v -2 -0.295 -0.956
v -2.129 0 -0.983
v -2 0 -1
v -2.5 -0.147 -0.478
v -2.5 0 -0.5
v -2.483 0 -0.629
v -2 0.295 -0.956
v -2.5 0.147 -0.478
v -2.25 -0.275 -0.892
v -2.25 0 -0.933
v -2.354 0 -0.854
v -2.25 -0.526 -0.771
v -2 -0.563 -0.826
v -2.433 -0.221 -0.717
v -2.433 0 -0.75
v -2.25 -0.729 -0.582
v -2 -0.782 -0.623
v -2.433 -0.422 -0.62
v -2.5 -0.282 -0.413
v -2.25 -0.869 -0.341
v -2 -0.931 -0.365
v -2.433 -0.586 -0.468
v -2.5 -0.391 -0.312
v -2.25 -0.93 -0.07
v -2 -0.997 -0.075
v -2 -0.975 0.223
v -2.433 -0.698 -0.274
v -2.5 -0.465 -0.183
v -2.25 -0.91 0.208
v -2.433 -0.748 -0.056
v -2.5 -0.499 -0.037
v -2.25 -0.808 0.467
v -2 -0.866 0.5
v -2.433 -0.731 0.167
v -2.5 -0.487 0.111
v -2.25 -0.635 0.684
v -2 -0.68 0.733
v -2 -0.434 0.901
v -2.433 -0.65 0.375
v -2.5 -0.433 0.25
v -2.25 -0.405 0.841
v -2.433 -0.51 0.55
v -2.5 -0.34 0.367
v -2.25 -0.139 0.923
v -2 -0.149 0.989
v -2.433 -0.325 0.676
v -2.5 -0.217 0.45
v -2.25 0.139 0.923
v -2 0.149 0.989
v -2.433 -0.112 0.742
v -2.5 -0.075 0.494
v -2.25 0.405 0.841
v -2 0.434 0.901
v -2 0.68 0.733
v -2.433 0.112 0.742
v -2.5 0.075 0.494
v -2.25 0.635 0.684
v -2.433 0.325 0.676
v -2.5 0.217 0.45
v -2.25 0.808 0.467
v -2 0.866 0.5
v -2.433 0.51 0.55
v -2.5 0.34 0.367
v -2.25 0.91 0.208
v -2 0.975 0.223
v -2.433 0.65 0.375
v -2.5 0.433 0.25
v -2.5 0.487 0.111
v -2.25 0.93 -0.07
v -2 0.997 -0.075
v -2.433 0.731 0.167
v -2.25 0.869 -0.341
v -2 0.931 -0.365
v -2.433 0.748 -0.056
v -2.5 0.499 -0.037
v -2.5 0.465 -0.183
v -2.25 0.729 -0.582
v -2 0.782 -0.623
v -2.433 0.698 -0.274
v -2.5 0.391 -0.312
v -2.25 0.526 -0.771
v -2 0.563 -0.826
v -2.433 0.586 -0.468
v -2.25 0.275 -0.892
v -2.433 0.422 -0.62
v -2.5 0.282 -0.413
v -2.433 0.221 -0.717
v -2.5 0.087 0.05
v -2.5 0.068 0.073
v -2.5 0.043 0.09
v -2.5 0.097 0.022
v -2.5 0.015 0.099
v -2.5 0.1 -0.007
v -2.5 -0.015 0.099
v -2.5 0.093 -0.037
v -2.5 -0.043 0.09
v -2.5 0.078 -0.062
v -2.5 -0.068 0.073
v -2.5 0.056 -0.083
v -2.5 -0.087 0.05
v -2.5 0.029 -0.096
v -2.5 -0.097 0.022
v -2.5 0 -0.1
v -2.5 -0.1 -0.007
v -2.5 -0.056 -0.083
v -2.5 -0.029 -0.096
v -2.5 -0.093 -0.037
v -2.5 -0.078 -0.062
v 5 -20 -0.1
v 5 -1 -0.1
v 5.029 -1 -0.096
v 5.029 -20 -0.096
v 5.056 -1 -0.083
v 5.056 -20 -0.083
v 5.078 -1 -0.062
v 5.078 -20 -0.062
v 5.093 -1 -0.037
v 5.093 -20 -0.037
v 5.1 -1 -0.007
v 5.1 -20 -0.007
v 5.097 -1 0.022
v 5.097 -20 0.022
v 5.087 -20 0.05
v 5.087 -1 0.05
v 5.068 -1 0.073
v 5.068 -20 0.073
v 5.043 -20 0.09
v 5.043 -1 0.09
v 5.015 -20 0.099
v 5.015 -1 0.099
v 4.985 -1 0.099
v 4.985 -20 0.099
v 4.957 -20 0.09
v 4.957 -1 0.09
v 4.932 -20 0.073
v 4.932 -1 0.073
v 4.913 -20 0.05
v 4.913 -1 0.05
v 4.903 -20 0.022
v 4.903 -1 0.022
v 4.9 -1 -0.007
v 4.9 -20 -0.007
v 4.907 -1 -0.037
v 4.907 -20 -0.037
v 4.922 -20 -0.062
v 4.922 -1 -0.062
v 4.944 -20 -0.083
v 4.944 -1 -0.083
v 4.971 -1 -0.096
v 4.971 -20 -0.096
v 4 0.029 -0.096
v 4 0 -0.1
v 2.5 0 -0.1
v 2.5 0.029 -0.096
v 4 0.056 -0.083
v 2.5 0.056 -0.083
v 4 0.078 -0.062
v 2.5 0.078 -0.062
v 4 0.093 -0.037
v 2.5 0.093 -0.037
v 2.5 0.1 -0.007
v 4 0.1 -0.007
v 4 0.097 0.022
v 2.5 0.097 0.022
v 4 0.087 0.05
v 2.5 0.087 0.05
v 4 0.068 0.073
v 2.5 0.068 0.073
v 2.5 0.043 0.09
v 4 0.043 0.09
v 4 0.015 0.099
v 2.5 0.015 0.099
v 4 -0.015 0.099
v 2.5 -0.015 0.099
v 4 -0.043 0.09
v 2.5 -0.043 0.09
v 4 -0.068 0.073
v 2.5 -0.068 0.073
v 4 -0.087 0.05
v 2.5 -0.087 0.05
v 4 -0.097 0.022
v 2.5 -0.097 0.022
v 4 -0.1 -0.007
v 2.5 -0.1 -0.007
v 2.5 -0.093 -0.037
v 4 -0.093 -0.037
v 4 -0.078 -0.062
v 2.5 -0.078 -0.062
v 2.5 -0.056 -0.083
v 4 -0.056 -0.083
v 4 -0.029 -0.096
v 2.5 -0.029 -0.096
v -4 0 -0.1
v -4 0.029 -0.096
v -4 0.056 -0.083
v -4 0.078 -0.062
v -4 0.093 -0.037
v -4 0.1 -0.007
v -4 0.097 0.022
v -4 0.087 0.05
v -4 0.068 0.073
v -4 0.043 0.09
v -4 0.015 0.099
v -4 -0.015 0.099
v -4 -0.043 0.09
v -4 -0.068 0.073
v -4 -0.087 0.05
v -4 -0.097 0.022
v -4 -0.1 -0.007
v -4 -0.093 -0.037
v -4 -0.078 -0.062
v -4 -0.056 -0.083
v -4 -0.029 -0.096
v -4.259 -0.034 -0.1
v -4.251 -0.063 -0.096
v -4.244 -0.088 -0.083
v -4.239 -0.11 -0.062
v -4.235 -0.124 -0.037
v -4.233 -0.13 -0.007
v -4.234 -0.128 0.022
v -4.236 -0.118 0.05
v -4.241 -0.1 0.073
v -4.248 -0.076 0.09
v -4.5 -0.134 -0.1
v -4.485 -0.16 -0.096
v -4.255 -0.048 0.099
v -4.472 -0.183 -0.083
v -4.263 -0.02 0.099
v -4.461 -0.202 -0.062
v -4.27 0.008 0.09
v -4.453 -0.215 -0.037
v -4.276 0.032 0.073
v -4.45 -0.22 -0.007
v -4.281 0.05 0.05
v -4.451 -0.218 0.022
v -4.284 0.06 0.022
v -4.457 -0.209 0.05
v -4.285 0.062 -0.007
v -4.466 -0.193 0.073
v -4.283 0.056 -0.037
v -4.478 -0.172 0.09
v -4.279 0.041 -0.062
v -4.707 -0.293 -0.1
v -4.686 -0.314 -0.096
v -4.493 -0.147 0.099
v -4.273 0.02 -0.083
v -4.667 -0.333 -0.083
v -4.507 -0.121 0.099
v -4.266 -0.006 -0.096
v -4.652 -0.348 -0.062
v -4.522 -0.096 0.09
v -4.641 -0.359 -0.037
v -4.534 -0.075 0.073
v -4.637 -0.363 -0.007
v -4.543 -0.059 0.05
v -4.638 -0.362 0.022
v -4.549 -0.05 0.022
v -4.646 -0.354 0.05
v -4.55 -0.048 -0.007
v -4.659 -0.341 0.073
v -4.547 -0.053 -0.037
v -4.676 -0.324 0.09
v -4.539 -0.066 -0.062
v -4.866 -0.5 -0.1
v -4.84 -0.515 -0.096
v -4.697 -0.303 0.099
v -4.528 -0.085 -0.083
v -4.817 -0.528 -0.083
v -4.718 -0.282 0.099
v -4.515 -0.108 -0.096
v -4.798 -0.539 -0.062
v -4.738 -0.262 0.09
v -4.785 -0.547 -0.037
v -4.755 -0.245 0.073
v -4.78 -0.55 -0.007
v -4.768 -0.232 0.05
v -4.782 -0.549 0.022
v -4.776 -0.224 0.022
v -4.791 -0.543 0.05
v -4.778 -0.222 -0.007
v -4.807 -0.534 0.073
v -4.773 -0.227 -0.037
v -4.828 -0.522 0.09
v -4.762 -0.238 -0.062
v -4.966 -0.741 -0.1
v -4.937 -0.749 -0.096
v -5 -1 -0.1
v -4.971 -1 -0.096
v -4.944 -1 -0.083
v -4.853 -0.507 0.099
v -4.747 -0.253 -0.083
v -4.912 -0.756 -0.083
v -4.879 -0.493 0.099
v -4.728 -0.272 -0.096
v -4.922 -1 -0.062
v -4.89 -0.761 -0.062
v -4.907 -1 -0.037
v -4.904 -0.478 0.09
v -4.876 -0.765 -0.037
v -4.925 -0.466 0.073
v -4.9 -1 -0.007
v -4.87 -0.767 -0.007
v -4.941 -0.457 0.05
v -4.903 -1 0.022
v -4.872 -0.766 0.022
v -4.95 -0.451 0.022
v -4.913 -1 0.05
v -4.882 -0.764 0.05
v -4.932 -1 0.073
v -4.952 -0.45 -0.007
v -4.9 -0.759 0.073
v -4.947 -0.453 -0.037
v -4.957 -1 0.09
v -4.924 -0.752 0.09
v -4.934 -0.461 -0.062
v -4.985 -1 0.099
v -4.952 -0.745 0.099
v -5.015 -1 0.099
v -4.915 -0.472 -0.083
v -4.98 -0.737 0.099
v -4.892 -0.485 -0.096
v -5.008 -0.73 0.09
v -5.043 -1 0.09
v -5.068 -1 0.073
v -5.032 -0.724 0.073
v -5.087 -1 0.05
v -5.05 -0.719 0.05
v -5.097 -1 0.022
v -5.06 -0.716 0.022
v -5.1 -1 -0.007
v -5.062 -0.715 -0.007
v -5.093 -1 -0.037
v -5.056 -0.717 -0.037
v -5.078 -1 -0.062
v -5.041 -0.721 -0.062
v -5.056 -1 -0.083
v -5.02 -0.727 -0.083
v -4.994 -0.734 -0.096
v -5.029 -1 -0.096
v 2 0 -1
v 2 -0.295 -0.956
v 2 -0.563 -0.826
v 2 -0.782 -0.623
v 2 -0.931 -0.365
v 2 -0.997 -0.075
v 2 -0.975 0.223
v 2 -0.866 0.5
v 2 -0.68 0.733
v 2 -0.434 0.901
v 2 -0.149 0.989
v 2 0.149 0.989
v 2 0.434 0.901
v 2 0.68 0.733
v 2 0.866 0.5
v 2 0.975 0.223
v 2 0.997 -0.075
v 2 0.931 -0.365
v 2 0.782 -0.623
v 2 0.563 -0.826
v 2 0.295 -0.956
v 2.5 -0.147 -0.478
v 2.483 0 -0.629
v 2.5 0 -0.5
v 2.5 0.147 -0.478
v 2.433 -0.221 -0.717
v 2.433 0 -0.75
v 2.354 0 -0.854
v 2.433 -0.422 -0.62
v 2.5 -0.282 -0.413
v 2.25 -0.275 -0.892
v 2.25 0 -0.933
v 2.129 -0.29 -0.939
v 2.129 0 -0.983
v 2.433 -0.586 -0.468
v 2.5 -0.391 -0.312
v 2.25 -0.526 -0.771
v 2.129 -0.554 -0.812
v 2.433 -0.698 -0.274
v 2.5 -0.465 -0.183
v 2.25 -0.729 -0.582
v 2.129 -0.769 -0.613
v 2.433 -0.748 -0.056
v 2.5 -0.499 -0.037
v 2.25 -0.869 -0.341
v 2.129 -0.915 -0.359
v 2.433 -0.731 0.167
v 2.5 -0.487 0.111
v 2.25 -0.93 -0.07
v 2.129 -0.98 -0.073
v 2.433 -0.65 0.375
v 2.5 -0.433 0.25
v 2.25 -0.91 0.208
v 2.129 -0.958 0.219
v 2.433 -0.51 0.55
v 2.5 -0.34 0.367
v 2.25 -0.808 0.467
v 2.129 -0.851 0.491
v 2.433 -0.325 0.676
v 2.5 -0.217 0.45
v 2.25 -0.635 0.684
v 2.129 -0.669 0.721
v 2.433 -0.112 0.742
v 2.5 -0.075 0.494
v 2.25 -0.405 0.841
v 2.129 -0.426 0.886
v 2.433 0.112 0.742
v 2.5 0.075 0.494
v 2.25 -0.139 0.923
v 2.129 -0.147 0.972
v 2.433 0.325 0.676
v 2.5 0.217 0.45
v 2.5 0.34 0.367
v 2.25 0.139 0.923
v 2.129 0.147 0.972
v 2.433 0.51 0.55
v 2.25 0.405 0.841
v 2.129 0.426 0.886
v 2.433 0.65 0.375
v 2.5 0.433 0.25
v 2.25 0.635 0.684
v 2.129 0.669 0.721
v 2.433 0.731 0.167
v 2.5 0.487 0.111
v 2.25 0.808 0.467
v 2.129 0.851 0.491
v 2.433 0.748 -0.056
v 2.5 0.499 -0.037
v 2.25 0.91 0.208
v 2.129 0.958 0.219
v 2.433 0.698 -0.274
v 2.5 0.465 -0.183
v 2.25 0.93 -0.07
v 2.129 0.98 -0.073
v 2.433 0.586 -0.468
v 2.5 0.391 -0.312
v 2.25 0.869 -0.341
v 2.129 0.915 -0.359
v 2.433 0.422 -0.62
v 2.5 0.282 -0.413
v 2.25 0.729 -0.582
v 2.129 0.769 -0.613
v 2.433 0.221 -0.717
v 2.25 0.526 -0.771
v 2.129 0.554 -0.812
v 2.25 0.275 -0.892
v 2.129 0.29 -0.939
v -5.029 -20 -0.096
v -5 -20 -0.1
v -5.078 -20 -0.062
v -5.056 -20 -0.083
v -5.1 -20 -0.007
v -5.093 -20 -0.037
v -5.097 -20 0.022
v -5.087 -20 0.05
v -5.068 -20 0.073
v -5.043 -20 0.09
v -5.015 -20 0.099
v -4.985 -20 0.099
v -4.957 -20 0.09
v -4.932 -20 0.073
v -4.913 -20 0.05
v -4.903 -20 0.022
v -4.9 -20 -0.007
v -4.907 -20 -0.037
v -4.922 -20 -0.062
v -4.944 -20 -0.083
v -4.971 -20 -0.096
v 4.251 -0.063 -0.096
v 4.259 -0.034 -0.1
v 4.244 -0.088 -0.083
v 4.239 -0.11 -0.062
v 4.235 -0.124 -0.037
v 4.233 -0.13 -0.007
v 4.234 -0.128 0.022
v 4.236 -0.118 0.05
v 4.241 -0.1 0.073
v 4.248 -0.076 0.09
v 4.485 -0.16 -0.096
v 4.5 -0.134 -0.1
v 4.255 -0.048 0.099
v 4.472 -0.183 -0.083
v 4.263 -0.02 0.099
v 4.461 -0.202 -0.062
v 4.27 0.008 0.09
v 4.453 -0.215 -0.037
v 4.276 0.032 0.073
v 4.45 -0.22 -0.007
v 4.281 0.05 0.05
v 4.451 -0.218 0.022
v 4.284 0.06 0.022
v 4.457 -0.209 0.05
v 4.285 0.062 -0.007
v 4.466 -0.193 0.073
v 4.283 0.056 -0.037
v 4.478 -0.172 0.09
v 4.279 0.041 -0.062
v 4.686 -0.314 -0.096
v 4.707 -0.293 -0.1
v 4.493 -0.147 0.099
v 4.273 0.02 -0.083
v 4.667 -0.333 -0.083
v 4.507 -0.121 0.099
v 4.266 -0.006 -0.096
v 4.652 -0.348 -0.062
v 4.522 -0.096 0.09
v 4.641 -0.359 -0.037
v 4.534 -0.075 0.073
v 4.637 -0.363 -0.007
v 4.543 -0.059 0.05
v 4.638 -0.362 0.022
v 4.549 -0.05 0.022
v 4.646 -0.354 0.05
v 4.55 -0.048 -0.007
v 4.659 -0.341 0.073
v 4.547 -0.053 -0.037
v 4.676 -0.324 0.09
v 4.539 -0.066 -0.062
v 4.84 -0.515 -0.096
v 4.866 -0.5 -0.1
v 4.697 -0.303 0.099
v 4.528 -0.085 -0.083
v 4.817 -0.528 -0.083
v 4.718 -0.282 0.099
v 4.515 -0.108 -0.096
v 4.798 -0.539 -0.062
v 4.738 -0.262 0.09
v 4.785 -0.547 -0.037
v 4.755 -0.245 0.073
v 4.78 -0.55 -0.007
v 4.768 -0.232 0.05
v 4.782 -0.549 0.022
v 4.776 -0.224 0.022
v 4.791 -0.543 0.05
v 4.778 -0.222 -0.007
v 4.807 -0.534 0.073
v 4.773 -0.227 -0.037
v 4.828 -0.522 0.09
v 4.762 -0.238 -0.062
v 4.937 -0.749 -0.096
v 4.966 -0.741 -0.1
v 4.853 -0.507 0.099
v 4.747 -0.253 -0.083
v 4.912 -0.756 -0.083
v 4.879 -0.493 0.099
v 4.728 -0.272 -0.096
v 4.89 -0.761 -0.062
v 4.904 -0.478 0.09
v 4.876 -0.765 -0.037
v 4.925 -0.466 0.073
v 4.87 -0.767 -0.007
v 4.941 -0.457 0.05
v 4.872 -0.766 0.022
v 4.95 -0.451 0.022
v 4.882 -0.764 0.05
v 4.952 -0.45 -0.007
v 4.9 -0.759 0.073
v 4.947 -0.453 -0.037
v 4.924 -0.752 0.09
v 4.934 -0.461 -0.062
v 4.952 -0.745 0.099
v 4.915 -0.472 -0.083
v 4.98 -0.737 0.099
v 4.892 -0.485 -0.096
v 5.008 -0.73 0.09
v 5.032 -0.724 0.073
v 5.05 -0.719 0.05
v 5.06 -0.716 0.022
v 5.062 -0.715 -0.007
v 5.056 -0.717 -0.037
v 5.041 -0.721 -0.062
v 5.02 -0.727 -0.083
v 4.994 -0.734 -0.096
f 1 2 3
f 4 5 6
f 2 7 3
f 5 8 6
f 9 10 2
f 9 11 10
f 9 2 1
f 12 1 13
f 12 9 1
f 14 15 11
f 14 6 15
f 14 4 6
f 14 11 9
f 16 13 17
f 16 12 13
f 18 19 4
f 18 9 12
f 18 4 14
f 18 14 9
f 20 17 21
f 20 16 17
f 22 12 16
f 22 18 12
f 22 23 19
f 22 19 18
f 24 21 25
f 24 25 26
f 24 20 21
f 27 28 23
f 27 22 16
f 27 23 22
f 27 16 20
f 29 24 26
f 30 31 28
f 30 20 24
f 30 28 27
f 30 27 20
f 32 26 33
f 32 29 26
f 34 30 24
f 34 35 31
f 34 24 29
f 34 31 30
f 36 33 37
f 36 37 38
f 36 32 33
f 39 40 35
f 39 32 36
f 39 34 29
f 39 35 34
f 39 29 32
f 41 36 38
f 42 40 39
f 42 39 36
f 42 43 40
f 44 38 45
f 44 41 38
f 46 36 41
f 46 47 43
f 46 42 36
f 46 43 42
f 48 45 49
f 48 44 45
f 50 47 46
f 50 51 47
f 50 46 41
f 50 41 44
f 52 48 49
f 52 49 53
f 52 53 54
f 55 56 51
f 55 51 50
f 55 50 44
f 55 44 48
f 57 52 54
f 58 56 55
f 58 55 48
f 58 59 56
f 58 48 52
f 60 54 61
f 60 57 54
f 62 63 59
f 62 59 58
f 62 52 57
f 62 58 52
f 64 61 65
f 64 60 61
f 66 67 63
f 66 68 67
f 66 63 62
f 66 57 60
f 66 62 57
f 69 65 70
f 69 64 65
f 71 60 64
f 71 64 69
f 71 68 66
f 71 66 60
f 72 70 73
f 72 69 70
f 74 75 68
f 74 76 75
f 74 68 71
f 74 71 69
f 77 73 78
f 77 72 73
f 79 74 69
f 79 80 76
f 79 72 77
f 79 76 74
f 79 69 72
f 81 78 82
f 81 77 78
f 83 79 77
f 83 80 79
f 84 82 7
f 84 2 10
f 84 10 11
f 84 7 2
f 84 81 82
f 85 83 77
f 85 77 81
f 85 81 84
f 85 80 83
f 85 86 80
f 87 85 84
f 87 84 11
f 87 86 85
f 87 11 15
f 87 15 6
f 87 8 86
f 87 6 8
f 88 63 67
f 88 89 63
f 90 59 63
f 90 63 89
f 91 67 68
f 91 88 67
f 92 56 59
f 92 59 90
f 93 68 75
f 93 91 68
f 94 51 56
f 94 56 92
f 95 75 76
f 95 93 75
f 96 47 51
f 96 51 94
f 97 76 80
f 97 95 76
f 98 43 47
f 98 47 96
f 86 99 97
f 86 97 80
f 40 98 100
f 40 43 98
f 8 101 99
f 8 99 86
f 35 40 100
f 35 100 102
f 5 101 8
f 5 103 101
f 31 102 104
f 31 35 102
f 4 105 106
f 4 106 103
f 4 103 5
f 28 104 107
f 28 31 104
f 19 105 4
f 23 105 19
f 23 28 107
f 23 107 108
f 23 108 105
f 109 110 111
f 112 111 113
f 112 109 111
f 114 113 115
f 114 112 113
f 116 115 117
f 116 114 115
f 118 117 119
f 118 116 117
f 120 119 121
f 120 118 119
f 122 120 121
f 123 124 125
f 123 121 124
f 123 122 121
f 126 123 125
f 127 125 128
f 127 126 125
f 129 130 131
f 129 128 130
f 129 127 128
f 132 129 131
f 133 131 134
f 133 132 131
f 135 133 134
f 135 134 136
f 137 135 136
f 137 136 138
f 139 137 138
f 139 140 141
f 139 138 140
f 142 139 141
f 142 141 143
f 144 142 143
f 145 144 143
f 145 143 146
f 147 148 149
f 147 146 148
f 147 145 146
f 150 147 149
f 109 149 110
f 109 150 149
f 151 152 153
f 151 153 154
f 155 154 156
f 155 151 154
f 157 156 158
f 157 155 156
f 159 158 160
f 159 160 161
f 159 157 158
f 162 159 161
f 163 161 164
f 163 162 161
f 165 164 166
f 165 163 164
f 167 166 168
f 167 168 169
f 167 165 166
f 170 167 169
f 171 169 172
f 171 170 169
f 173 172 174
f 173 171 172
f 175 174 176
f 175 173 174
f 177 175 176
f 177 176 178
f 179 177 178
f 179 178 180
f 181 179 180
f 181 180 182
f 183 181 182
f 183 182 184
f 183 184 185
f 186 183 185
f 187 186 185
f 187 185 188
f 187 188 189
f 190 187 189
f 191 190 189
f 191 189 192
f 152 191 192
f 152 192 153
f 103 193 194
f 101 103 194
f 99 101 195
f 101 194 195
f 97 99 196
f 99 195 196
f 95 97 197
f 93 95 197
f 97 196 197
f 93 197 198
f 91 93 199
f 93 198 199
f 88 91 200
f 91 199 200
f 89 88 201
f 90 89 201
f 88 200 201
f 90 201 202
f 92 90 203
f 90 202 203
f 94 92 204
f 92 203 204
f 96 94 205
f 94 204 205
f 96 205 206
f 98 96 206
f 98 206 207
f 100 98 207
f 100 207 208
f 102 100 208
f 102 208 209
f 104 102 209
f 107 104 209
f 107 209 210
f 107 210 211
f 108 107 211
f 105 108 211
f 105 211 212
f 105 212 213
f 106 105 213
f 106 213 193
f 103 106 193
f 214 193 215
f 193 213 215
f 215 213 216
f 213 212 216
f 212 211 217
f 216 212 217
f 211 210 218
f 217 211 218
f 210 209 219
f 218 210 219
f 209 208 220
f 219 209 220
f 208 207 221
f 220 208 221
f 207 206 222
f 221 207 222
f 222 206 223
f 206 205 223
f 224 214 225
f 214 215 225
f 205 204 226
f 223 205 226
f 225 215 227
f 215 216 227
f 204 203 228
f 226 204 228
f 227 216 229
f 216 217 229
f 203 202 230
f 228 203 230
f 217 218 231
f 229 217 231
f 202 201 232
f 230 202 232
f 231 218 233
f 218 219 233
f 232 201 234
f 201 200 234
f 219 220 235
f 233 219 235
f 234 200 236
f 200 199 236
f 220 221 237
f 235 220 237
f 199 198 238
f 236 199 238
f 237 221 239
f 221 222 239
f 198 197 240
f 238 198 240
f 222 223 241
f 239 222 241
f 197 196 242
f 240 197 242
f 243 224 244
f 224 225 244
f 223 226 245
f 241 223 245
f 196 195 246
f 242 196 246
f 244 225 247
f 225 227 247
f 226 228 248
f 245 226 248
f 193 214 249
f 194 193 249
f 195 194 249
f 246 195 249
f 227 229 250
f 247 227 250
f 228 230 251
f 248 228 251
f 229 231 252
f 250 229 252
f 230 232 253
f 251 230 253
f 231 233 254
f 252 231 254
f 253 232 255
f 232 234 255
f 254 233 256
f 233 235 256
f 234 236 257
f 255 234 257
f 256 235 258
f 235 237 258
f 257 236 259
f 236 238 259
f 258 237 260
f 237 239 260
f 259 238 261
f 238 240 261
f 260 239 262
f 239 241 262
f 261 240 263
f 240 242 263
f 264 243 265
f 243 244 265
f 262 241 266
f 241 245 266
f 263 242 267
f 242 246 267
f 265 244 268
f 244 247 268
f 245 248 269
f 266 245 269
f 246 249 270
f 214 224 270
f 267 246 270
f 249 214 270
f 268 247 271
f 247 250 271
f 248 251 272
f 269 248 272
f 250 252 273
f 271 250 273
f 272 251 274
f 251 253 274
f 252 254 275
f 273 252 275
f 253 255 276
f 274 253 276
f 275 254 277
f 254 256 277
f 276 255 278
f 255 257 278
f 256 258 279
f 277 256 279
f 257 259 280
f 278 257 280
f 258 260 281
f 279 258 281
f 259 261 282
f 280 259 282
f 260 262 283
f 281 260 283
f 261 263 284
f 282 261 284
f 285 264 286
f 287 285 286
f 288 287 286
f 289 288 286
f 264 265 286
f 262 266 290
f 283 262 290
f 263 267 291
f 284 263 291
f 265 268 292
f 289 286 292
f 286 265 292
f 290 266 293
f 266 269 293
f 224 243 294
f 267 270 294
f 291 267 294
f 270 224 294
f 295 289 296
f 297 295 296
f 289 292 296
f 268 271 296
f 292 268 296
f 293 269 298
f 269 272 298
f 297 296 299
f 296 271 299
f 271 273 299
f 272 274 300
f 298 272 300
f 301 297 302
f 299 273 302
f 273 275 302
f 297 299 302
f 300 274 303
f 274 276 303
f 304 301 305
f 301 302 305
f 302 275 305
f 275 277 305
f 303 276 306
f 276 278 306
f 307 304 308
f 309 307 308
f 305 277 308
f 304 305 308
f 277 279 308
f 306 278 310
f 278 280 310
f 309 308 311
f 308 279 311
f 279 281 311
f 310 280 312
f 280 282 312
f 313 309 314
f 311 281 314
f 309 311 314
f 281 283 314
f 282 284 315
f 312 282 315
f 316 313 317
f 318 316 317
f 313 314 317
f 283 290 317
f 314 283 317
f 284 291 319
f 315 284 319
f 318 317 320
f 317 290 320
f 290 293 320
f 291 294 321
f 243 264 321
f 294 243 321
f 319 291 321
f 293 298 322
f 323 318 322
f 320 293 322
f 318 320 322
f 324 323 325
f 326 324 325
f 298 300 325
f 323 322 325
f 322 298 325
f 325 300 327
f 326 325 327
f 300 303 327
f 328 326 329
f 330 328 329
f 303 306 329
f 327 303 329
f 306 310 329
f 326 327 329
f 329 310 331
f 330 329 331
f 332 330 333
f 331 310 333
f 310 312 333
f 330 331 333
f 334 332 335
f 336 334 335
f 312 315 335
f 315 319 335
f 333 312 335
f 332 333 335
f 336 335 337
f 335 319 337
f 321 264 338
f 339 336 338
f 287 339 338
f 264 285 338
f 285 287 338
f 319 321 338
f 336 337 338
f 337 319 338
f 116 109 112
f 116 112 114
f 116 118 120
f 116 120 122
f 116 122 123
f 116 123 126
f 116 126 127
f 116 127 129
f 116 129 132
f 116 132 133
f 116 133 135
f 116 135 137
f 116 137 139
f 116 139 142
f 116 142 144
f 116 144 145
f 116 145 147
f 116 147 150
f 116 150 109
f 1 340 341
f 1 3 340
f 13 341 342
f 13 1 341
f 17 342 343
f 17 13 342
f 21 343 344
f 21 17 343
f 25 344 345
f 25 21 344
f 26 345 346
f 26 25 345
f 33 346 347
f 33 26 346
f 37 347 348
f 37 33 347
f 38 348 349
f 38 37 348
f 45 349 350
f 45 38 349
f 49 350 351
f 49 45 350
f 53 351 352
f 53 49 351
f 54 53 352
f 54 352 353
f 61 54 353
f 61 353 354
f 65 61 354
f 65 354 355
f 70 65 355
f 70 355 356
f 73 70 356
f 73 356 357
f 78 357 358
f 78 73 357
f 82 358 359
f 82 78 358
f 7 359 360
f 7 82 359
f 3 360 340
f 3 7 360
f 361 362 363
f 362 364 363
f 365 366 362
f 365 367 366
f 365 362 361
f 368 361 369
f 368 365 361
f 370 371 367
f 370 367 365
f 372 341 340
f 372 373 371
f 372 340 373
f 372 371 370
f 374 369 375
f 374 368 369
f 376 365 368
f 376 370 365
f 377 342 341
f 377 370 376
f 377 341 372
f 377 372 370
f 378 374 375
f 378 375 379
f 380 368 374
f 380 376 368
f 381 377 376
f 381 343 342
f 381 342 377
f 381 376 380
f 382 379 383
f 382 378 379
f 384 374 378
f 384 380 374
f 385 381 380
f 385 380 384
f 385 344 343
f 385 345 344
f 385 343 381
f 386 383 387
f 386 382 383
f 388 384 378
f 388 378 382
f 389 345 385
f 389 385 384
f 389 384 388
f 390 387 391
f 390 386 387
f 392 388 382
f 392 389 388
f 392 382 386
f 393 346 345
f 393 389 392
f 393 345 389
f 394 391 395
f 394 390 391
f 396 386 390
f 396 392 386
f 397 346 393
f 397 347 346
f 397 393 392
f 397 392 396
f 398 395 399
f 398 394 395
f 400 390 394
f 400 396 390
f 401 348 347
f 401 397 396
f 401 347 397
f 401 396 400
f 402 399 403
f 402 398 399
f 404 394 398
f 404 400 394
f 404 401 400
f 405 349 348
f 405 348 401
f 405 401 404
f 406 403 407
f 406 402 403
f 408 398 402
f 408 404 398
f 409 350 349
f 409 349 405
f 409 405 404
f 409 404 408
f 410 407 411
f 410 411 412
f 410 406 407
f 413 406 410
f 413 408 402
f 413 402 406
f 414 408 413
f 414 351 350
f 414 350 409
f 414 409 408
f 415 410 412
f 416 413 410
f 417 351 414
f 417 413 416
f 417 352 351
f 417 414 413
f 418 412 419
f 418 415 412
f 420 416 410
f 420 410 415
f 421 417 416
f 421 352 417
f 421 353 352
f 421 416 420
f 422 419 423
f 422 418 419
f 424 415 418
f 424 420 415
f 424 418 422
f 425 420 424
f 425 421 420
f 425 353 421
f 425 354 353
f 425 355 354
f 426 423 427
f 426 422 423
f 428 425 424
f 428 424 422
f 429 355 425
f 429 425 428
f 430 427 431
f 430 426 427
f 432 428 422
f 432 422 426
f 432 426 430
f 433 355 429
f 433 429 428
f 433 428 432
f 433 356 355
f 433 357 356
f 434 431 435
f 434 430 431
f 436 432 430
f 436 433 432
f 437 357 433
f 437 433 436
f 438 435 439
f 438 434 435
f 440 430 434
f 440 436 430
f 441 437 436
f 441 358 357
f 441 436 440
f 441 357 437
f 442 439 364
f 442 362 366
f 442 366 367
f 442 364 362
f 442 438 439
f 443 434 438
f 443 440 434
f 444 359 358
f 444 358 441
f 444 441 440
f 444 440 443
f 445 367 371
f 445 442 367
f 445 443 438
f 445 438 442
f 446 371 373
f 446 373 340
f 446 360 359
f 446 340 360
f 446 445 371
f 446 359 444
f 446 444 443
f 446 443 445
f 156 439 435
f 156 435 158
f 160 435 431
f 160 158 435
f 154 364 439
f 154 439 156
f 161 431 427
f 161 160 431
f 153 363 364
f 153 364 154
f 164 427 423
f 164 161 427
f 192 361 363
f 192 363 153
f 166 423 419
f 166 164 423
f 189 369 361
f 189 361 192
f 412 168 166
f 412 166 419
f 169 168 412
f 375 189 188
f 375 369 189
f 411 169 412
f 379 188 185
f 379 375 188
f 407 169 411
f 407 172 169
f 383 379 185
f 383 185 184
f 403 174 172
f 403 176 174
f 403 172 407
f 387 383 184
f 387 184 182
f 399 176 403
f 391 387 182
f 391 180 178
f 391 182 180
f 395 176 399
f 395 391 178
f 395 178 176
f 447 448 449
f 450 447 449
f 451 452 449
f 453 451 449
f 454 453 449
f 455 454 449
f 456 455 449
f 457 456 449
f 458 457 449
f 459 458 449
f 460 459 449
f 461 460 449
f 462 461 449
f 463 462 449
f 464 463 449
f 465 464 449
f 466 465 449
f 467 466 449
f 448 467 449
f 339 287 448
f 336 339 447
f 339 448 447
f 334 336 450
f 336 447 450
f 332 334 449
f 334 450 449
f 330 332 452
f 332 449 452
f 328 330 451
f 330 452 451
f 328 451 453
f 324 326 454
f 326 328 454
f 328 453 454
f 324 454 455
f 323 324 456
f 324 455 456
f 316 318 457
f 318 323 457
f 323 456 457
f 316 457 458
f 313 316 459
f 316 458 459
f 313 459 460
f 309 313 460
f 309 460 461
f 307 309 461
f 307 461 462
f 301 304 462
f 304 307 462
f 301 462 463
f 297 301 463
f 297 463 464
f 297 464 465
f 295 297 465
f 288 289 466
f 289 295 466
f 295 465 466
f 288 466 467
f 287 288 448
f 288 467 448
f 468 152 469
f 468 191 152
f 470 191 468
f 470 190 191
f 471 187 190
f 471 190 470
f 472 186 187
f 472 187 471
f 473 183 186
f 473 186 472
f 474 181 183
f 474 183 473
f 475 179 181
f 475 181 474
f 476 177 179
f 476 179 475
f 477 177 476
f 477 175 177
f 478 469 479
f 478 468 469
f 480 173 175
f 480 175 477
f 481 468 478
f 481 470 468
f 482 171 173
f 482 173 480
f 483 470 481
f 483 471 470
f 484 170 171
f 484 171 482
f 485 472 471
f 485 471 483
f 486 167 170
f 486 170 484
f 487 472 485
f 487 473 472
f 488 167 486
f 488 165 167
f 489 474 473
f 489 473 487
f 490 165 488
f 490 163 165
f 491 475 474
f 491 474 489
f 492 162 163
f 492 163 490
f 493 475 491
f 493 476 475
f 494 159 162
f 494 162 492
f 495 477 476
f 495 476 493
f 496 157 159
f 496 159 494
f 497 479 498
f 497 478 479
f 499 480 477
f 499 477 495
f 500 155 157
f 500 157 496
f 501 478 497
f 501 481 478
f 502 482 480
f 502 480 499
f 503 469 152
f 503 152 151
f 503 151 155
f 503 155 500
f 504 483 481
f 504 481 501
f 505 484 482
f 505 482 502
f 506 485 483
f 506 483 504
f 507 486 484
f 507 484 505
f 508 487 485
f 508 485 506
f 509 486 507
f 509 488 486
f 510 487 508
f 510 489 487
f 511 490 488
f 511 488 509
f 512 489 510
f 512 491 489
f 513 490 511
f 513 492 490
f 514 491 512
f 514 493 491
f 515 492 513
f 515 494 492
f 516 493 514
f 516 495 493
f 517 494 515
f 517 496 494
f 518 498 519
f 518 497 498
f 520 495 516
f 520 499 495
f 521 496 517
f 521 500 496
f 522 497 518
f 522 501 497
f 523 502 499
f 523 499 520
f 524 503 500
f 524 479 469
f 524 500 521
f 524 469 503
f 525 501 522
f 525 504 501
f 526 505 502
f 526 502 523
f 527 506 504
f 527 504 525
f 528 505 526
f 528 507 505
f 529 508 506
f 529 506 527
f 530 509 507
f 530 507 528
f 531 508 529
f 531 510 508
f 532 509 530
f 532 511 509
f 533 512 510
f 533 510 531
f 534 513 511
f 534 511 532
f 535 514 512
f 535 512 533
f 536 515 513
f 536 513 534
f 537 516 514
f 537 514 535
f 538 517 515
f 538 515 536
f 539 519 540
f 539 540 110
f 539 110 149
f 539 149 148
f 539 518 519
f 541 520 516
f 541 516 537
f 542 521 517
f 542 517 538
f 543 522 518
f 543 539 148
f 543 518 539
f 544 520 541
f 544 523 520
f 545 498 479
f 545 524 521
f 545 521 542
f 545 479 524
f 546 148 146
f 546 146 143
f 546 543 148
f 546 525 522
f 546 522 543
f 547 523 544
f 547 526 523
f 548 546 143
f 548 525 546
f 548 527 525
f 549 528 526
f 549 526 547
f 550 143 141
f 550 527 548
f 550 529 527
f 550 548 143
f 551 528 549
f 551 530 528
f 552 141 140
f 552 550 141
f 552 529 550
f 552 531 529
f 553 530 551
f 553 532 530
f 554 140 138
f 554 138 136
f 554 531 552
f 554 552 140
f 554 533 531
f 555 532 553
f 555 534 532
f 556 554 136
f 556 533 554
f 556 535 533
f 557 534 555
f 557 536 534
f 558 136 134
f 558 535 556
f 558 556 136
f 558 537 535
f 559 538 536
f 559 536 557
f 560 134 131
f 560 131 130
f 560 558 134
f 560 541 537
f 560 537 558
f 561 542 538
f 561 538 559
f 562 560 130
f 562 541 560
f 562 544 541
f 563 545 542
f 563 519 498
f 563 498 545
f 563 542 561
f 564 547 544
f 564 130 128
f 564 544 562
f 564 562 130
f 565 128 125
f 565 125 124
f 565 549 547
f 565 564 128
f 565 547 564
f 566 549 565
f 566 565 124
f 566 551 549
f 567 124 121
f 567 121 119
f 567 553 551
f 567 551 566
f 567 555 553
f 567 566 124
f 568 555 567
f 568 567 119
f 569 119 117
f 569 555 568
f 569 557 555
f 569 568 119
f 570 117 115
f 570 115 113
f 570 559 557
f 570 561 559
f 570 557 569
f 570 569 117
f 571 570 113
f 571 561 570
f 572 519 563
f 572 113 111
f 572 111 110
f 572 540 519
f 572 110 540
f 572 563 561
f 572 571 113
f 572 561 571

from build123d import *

# Parameters (mm, degrees)
SKETCH3_R = 0.1


with BuildPart() as part:
    # Sketch1 → Revolve1 (revolve)
    with BuildSketch(Plane.XY, mode=Mode.PRIVATE) as revolve1_sk:
        with BuildLine():
            Line((2.5, 0), (2.5, 0.5))
            ThreePointArc((2.5, 0.5), (2.353553391, 0.853553391), (2, 1))
            Line((2, 1), (-2, 1))
            ThreePointArc((-2, 1), (-2.353553391, 0.853553391), (-2.5, 0.5))
            Line((-2.5, 0.5), (-2.5, 0))
            Line((-2.5, 0), (2.5, 0))
        make_face()
    revolve(revolve1_sk.sketch.rotate(Axis((15.850565012, 0, 0), (-1, 0, 0)), 90), axis=Axis((15.850565012, 0, 0), (-1, 0, 0)))

    # Sweep1: sweep along a path in Sketch2
    with BuildLine(Plane.XY) as sweep1_path:
        Line((2.5, 0), (4, 0))
        ThreePointArc((4, 0), (4.707106781, -0.292893219), (5, -1))
        Line((5, -1), (5, -20))
    # Sketch3 → Sweep1 (sweep)
    with BuildSketch(Plane(origin=(2.5, 0, 0), x_dir=(0, 0, -1), z_dir=(1, 0, 0))):
        Circle(SKETCH3_R)
    sweep1 = sweep(path=sweep1_path.line)

    # Mirror1: Sweep1 across plane
    add(sweep1.mirror(Plane(origin=(0, 0, 0), x_dir=(0, 0, 1), z_dir=(1, 0, 0))))


solid = part.part
